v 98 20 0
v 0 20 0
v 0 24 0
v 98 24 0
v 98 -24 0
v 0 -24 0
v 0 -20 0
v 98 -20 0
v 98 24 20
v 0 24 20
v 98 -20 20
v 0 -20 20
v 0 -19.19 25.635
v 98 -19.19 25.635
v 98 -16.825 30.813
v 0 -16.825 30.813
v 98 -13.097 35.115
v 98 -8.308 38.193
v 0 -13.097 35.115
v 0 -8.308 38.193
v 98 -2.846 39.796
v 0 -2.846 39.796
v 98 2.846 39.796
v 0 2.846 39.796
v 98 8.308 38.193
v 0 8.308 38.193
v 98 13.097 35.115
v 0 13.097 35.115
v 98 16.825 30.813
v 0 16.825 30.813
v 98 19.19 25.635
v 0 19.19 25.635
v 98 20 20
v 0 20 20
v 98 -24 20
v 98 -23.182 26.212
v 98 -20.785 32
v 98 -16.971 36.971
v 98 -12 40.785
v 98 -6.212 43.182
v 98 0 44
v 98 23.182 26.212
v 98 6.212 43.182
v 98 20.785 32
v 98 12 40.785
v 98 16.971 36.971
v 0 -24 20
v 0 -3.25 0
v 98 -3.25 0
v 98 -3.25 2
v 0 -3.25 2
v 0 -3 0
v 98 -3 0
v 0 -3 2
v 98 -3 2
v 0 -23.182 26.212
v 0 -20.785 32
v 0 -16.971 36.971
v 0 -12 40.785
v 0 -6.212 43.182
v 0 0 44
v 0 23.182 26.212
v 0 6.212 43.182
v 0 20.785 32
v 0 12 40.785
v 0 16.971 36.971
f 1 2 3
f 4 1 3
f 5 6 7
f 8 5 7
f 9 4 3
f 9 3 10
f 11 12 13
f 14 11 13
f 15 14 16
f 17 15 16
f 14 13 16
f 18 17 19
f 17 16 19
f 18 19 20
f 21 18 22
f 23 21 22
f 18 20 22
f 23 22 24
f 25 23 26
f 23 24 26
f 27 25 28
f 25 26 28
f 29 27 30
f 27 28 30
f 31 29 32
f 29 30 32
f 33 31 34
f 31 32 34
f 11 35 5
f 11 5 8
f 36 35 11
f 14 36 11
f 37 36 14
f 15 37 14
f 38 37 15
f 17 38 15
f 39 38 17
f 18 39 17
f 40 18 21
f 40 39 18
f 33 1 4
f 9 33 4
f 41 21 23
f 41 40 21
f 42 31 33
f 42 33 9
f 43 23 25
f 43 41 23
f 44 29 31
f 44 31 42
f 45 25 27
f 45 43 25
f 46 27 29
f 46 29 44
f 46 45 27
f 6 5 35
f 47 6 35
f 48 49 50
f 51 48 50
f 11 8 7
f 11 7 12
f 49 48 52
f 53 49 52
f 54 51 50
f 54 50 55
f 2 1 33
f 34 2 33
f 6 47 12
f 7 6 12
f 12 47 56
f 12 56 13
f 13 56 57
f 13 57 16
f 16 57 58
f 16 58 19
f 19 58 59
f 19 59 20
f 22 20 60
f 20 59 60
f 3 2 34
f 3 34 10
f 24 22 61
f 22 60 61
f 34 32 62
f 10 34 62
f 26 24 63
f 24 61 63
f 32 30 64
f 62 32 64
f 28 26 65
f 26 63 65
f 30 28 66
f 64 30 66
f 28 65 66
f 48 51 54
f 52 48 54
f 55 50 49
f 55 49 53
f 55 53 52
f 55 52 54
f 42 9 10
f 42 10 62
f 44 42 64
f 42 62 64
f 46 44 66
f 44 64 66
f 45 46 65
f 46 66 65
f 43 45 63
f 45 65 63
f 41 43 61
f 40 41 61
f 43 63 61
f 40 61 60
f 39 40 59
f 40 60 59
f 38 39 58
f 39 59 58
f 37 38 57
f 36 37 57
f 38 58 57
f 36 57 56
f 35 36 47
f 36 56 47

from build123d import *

# Parameters (mm, degrees)
F1_W     = 4
F1_H     = 20
F0_W     = 0.25
F0_H     = 2
F2_DEPTH = 98


with BuildPart() as f2:
    # F1 (on Right) + F0 (on Right) → F2 (new body)
    with BuildSketch(Plane.YZ):
        with Locations((-22, 10)):
            Rectangle(F1_W, F1_H)
        with Locations((22, 10)):
            Rectangle(F1_W, F1_H)
        with BuildLine():
            Line((-24, 20), (-20, 20))
            ThreePointArc((-20, 20), (0, 40), (20, 20))
            Line((20, 20), (24, 20))
            ThreePointArc((24, 20), (0, 44), (-24, 20))
        make_face()
    with BuildSketch(Plane.YZ):
        with Locations((-3.125, 1)):
            Rectangle(F0_W, F0_H)
    extrude(amount=F2_DEPTH)


solid = f2.part
